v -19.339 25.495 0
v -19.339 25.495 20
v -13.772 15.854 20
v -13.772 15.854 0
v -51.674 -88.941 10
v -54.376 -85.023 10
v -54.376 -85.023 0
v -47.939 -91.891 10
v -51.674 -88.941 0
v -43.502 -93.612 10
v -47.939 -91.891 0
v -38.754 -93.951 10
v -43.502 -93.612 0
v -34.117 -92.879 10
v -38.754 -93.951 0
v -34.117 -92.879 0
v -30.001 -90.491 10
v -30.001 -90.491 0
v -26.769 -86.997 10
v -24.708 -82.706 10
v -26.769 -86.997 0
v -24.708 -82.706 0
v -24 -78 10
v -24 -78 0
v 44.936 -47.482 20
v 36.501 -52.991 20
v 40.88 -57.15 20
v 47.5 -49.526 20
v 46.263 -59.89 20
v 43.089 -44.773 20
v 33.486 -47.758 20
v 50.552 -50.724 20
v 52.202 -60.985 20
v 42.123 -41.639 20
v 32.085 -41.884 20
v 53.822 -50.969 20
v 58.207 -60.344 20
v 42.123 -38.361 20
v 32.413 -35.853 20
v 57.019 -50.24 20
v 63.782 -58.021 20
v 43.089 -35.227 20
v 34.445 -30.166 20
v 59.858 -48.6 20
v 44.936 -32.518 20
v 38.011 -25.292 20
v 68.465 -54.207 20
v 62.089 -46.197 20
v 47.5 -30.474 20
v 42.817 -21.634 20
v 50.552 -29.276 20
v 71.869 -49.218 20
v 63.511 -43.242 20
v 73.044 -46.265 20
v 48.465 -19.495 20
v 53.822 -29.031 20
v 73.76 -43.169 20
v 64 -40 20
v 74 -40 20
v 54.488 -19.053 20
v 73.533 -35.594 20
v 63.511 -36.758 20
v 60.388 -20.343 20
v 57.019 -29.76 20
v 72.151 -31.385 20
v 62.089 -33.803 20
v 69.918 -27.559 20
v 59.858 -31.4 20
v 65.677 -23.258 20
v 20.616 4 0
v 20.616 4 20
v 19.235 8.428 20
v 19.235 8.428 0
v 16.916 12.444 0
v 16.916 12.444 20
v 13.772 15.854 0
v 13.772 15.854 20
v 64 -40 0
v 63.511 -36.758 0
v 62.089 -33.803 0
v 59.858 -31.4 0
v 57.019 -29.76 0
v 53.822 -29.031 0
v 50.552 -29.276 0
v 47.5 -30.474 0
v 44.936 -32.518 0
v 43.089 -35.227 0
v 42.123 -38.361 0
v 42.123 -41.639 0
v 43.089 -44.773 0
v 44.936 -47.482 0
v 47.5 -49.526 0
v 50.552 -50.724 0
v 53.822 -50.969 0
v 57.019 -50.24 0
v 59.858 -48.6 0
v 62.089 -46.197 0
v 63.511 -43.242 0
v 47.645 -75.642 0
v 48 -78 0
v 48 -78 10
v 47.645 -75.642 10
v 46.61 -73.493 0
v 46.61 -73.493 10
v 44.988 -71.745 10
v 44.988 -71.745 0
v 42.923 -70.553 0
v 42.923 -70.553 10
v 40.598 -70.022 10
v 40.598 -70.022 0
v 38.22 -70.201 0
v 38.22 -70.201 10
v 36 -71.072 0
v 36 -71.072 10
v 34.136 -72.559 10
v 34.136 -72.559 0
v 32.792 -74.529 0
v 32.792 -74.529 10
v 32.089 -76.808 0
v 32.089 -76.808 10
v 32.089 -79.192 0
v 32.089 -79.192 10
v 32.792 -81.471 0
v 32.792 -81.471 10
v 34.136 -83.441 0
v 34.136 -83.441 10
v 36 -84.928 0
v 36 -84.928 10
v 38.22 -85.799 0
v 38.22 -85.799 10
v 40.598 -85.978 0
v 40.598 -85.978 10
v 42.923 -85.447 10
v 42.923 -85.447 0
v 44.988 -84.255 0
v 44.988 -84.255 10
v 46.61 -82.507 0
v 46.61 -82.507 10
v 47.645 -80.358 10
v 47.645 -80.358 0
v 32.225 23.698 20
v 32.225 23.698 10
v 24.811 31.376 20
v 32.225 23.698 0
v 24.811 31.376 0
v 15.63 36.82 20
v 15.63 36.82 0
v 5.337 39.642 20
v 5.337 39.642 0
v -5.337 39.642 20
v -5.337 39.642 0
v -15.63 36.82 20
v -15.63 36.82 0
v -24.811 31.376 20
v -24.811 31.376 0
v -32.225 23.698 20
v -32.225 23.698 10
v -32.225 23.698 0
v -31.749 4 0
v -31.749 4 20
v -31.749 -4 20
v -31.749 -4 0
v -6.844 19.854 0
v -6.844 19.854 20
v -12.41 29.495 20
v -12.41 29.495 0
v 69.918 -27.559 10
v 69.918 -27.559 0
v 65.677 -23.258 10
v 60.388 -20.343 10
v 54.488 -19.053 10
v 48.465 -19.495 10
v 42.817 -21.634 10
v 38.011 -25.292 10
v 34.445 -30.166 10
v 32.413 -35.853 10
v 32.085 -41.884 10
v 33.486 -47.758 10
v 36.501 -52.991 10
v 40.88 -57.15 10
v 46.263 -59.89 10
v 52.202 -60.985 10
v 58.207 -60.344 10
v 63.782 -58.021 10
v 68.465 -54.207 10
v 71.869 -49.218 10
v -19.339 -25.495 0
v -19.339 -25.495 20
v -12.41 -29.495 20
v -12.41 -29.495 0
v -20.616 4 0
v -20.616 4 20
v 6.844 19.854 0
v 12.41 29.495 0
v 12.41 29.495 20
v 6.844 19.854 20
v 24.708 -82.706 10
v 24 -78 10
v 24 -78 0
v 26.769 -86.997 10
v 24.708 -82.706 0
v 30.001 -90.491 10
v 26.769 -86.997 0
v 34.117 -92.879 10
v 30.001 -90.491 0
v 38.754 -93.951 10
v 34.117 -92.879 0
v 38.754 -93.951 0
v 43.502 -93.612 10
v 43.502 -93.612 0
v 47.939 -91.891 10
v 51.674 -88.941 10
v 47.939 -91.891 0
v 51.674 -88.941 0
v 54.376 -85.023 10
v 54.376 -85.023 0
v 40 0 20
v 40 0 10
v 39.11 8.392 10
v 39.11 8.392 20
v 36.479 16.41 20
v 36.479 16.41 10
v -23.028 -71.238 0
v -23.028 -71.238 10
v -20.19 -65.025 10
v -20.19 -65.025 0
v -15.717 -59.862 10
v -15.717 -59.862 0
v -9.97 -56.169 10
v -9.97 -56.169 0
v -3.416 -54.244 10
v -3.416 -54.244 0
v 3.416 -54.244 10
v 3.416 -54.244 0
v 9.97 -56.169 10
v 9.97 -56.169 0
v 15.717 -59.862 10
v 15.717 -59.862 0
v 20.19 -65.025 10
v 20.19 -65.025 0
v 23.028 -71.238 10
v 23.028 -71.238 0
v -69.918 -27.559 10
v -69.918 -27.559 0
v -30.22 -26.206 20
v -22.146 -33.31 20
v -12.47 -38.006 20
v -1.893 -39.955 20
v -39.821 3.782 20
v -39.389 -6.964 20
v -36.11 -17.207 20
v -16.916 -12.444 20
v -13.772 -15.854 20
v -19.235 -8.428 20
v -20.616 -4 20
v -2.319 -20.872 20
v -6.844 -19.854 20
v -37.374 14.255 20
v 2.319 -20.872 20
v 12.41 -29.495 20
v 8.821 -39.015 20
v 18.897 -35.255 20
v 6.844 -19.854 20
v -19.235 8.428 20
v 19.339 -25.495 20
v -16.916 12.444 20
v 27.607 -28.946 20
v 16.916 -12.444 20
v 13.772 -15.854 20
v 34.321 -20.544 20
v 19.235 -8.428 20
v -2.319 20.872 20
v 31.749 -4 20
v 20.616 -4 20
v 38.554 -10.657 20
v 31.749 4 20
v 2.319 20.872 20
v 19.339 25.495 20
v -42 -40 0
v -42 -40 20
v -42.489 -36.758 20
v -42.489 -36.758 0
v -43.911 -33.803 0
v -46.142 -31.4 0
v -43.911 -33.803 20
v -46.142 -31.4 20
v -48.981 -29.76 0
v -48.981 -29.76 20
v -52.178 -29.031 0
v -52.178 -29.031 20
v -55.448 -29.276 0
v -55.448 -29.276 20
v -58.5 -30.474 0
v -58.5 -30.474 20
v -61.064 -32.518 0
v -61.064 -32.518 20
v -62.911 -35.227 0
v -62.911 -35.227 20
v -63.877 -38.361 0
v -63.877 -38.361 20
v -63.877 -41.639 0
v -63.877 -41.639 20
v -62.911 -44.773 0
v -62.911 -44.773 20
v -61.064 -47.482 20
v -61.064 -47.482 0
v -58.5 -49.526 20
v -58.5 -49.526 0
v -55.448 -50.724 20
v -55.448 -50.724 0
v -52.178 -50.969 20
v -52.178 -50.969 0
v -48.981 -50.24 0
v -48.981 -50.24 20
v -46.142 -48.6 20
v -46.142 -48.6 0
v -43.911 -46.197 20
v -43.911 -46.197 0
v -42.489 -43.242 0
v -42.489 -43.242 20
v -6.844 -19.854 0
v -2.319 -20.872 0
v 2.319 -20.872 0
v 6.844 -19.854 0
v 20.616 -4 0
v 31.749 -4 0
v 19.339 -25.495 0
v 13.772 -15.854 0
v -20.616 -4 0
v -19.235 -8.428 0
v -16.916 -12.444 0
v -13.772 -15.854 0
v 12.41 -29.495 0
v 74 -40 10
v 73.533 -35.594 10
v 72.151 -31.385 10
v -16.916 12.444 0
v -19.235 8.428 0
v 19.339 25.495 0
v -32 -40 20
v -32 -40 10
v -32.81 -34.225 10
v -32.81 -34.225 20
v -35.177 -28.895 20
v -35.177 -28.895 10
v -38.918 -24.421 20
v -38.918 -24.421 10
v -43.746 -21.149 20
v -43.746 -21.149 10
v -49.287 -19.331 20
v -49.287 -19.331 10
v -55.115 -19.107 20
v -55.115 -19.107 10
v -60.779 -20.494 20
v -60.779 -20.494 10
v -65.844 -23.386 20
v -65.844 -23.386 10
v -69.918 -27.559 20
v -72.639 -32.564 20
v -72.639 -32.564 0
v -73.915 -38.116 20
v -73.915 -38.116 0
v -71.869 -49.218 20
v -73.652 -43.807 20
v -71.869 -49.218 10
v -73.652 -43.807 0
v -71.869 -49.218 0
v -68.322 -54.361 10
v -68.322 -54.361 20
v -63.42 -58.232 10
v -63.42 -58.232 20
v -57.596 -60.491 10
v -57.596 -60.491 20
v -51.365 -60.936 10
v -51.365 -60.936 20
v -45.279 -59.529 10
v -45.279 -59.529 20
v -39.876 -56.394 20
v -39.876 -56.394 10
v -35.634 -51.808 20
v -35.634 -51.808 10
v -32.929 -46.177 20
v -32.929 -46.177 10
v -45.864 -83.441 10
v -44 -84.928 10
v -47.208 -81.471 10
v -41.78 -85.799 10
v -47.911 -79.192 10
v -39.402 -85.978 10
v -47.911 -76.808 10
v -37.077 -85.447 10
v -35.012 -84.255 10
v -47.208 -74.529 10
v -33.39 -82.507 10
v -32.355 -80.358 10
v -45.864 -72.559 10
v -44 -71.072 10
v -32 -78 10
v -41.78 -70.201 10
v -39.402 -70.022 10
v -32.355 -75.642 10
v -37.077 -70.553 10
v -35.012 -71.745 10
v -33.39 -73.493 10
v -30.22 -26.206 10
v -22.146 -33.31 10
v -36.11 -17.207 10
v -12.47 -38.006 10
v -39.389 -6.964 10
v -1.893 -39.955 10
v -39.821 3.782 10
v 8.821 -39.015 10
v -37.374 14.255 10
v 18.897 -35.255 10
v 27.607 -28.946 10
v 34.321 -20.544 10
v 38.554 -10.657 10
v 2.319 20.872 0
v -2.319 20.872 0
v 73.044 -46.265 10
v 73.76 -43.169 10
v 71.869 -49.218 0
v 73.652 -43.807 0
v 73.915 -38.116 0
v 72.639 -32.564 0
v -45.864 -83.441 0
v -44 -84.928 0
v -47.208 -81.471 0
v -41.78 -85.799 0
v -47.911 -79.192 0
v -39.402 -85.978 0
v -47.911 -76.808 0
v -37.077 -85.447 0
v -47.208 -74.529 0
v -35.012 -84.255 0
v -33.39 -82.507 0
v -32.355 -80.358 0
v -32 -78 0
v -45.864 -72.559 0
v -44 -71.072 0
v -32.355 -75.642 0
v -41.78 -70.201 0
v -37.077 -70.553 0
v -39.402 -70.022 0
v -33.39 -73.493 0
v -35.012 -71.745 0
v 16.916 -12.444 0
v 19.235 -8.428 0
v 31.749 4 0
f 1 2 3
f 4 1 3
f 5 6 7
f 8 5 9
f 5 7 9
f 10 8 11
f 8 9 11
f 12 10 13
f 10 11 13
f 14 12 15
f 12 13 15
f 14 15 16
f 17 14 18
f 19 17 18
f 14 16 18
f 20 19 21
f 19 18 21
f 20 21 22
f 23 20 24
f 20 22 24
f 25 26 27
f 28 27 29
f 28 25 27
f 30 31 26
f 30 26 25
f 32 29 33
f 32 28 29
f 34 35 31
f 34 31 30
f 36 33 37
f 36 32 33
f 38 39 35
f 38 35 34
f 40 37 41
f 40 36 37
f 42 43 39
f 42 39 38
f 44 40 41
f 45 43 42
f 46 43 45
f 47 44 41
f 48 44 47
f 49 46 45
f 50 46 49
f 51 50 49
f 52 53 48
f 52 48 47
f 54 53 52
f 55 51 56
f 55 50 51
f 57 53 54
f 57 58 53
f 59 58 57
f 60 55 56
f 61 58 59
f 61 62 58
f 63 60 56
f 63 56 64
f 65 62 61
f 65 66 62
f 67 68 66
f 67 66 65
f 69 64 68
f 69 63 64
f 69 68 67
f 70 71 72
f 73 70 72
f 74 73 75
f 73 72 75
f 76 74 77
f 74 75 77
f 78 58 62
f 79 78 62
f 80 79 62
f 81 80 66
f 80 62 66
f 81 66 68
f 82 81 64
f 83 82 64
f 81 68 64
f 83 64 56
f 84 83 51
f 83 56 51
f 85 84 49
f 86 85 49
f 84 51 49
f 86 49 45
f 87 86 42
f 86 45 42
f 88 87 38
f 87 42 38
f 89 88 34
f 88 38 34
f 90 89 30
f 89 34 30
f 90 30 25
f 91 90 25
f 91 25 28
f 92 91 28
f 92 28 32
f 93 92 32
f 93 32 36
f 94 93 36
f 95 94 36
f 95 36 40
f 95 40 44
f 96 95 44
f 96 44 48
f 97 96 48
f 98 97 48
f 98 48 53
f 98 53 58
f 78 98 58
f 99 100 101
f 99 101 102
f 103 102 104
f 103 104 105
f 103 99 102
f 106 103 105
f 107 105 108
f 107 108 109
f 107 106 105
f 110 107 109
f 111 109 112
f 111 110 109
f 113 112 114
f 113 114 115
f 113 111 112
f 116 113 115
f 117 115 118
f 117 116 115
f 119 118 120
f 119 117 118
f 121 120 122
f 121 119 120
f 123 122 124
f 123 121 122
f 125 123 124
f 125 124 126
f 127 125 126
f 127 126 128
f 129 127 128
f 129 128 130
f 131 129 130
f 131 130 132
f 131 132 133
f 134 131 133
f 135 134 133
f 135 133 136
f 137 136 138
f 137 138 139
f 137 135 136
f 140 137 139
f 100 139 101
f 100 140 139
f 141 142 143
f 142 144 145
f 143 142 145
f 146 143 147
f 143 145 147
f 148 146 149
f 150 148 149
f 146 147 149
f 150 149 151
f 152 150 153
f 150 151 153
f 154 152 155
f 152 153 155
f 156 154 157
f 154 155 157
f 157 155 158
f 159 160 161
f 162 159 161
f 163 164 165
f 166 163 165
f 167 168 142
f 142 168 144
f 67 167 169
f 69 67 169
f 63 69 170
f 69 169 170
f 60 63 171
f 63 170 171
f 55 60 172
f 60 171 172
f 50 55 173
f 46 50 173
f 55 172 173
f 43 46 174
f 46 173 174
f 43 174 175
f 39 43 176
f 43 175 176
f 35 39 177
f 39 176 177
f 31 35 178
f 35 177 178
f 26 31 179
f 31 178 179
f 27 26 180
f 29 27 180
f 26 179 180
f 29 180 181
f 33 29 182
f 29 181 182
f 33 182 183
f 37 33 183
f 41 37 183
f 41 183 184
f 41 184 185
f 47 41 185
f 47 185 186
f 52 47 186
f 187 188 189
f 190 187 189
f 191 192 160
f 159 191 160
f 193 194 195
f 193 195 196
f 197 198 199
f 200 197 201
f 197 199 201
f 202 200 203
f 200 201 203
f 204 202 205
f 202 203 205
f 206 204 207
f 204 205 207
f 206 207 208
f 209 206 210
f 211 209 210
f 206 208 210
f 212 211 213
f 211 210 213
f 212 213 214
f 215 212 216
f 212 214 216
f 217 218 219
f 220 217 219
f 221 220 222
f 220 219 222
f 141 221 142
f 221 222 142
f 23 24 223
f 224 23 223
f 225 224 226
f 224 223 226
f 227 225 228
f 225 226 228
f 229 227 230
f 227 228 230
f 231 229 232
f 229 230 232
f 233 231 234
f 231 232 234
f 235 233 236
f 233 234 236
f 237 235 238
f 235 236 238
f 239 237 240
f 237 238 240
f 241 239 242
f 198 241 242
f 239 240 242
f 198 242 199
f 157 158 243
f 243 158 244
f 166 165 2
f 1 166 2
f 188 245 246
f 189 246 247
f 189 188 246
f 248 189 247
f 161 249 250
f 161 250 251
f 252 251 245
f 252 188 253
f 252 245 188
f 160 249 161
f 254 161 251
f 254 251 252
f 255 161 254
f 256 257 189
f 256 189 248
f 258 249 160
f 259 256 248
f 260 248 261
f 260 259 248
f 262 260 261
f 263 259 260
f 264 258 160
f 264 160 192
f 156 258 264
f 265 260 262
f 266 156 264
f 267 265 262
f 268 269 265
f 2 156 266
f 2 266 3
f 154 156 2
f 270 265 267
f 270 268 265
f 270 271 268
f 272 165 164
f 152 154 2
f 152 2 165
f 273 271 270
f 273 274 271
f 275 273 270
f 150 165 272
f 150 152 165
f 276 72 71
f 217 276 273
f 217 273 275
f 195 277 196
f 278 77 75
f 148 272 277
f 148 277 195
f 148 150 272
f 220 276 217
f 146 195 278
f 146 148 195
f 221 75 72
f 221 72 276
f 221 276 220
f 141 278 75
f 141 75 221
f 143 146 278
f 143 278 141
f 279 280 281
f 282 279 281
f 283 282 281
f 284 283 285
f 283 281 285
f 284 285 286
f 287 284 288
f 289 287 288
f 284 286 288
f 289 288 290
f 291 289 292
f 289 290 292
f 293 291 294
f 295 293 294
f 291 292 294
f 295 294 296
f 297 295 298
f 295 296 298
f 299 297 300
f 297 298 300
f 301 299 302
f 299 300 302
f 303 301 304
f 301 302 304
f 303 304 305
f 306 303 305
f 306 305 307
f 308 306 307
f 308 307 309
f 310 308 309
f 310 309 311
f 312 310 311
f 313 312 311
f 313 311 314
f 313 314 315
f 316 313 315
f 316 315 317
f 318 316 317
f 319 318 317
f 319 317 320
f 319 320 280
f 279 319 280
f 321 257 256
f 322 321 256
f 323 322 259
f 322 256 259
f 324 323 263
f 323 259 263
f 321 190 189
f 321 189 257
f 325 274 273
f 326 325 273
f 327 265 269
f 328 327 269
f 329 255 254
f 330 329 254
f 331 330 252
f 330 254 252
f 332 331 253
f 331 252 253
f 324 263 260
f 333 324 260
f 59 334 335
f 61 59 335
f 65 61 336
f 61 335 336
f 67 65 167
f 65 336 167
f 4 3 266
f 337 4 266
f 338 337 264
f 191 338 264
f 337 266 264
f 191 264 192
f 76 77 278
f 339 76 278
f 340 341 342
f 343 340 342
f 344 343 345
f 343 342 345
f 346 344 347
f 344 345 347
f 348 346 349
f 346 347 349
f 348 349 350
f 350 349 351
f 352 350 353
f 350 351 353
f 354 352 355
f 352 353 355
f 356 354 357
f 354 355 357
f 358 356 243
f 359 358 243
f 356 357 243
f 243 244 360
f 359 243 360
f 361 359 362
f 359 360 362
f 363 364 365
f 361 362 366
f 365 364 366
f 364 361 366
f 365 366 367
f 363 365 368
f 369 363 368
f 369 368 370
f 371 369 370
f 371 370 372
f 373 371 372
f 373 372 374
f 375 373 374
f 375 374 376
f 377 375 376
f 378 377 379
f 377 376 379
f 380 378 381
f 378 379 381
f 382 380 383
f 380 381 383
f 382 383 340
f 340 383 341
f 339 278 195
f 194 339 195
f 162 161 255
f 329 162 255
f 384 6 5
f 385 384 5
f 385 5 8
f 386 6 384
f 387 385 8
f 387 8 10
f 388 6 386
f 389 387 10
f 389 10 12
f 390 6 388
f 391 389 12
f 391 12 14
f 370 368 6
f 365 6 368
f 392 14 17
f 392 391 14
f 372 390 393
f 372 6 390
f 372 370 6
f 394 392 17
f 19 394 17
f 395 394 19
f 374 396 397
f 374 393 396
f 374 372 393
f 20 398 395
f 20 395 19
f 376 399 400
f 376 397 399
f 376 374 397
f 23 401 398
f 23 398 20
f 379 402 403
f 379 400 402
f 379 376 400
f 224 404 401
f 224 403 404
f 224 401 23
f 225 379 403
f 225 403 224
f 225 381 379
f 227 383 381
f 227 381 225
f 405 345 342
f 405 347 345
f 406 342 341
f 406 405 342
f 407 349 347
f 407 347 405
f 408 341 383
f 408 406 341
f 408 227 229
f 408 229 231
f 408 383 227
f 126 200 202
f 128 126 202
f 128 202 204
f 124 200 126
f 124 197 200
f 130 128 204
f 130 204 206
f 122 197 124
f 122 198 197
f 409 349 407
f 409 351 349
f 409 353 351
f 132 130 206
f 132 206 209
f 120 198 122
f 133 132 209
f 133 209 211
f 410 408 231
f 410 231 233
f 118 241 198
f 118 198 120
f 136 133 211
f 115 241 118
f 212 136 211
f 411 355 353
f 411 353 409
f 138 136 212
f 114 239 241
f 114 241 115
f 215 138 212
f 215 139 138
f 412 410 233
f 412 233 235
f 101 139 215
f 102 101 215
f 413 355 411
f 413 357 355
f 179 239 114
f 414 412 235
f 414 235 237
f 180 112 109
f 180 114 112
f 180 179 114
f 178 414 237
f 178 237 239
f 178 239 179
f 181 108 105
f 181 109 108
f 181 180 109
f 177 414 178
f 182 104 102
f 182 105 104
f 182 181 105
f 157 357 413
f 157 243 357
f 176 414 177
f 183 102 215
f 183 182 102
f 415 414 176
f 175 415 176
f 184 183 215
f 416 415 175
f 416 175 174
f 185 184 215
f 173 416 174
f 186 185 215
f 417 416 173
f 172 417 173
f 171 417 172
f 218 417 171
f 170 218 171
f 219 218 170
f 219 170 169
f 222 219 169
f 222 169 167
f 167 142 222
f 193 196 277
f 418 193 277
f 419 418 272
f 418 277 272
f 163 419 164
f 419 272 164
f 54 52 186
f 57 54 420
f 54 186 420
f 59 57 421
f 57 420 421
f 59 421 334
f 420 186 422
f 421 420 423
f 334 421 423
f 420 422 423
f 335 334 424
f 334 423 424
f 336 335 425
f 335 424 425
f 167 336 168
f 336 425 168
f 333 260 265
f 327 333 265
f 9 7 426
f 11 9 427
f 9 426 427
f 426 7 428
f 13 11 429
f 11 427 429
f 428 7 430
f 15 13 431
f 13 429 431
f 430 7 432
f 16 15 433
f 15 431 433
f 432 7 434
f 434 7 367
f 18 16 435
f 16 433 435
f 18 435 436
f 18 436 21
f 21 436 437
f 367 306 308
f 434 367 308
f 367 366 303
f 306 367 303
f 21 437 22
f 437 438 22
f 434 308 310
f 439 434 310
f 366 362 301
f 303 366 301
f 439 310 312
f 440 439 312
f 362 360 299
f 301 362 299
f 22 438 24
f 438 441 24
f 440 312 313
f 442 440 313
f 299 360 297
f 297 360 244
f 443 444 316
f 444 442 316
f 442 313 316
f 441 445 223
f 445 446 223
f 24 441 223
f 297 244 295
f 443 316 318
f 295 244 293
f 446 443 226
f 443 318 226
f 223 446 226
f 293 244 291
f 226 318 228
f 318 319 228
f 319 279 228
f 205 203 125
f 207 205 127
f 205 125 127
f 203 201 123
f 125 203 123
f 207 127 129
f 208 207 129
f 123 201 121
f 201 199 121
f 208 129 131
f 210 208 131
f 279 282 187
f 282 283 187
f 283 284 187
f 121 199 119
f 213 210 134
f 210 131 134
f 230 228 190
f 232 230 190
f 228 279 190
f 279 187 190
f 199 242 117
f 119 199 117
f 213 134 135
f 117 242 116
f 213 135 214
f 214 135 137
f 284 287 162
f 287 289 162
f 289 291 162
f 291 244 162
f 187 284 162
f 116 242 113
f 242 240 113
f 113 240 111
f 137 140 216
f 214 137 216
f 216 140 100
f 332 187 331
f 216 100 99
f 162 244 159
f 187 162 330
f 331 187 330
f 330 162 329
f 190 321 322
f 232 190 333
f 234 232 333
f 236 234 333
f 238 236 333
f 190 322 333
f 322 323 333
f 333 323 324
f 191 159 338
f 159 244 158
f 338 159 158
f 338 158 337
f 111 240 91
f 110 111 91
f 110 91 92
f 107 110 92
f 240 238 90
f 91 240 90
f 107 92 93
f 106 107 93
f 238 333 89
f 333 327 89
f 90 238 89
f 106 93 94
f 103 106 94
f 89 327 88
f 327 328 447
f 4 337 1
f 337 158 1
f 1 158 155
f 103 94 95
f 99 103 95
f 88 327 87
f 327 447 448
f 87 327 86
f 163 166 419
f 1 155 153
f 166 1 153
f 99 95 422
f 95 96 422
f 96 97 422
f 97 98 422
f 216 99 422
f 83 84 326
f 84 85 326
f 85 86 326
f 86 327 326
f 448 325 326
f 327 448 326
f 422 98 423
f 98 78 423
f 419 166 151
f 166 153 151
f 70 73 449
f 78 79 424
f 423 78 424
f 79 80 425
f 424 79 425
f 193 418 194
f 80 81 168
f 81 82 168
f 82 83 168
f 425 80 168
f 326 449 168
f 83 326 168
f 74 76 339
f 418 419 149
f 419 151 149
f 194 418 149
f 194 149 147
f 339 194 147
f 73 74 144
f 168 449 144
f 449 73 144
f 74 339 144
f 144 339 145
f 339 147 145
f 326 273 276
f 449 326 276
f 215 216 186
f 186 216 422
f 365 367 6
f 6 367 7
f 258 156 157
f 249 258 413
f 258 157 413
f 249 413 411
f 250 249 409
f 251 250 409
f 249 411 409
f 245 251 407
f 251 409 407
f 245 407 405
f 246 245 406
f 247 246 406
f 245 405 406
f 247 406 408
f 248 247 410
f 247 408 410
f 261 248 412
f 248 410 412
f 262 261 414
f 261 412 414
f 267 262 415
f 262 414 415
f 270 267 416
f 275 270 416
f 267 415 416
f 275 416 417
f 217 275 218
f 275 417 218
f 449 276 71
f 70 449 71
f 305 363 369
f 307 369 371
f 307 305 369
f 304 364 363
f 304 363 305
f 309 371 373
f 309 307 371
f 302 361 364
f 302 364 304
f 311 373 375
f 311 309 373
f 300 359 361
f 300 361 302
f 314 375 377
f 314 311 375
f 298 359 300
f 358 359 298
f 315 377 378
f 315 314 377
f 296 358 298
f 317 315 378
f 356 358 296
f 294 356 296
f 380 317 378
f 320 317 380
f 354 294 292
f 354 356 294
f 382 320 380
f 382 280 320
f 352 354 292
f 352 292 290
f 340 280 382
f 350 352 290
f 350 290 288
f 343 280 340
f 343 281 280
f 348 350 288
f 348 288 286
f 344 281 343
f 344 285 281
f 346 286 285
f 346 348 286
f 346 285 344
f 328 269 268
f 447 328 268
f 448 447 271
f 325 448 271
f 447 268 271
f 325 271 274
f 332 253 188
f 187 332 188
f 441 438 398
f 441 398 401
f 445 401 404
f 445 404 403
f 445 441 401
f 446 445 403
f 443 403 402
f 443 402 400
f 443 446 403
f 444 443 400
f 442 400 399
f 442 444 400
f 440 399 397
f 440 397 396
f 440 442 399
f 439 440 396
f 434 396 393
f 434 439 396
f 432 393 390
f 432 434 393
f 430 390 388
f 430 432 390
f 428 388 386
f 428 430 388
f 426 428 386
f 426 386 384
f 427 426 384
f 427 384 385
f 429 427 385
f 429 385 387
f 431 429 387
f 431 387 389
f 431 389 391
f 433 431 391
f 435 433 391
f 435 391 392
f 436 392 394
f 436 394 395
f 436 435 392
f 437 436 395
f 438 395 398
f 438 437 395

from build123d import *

# Parameters (mm, degrees)
CROQUIS1_R              = 8
SALIENTE_EXTRUIR1_DEPTH = 10
SALIENTE_EXTRUIR2_DEPTH = 10
CROQUIS3_R              = 11
CORTAR_EXTRUIR1_DEPTH   = 122.2930336


with BuildPart() as part:
    # Croquis1 → Saliente-Extruir1 (new body)
    with BuildSketch(Plane.XY):
        with BuildLine():
            Line((-32.224593289, 23.697586108), (-69.917911477, -27.558767293))
            ThreePointArc((-69.917911477, -27.558767293), (-73.915346544, -38.116312412), (-71.868614208, -49.218210124))
            Line((-71.868614208, -49.218210124), (-54.376087015, -85.023398189))
            ThreePointArc((-54.376087015, -85.023398189), (-36.395654862, -93.588736194), (-24, -78))
            ThreePointArc((-24, -78), (0, -54), (24, -78))
            ThreePointArc((24, -78), (36.395654862, -93.588736194), (54.376087015, -85.023398189))
            Line((54.376087015, -85.023398189), (71.868614208, -49.218210124))
            ThreePointArc((71.868614208, -49.218210124), (73.915346544, -38.116312412), (69.917911477, -27.558767293))
            Line((69.917911477, -27.558767293), (32.224593289, 23.697586108))
            ThreePointArc((32.224593289, 23.697586108), (0, 40), (-32.224593289, 23.697586108))
        make_face()
        with Locations((-40, -78)):
            Circle(CROQUIS1_R, mode=Mode.SUBTRACT)
        with Locations((40, -78)):
            Circle(CROQUIS1_R, mode=Mode.SUBTRACT)
    extrude(amount=SALIENTE_EXTRUIR1_DEPTH)

    # Croquis2 → Saliente-Extruir2 (add)
    with BuildSketch(Plane.XY.offset(10)):
        with BuildLine():
            ThreePointArc((32.224593289, 23.697586108), (0, 40), (-32.224593289, 23.697586108))
            ThreePointArc((-32.224593289, 23.697586108), (-12.470290061, -38.006471367), (40, 0))
            ThreePointArc((40, 0), (38.006471367, 12.470290061), (32.224593289, 23.697586108))
        make_face()
        with BuildLine():
            ThreePointArc((-32, -40), (-46.453097718, -20.046602532), (-69.917911477, -27.558767293))
            ThreePointArc((-69.917911477, -27.558767293), (-73.915346544, -38.116312412), (-71.868614208, -49.218210124))
            ThreePointArc((-71.868614208, -49.218210124), (-48.269297006, -60.460216254), (-32, -40))
        make_face()
        with BuildLine():
            ThreePointArc((74, -40), (72.953397468, -33.453097718), (69.917911477, -27.558767293))
            ThreePointArc((69.917911477, -27.558767293), (32.084653456, -41.883687588), (71.868614208, -49.218210124))
            ThreePointArc((71.868614208, -49.218210124), (73.460216254, -44.730702994), (74, -40))
        make_face()
    extrude(amount=SALIENTE_EXTRUIR2_DEPTH)

    # Croquis3 → Cortar-Extruir1 (cut, through all)
    with BuildSketch(Plane.XY.offset(20)):
        with BuildLine():
            Line((-12.410406251, -29.49545417), (-6.843662449, -19.853571071))
            ThreePointArc((-6.843662449, -19.853571071), (0, -21), (6.843662449, -19.853571071))
            Line((6.843662449, -19.853571071), (12.410406251, -29.49545417))
            Line((12.410406251, -29.49545417), (19.338609482, -25.49545417))
            Line((19.338609482, -25.49545417), (13.771865679, -15.853571071))
            ThreePointArc((13.771865679, -15.853571071), (18.186533479, -10.5), (20.615528128, -4))
            Line((20.615528128, -4), (31.749015733, -4))
            Line((31.749015733, -4), (31.749015733, 4))
            Line((31.749015733, 4), (20.615528128, 4))
            ThreePointArc((20.615528128, 4), (18.186533479, 10.5), (13.771865679, 15.853571071))
            Line((13.771865679, 15.853571071), (19.338609482, 25.49545417))
            Line((19.338609482, 25.49545417), (12.410406251, 29.49545417))
            Line((12.410406251, 29.49545417), (6.843662449, 19.853571071))
            ThreePointArc((6.843662449, 19.853571071), (0, 21), (-6.843662449, 19.853571071))
            Line((-6.843662449, 19.853571071), (-12.410406251, 29.49545417))
            Line((-12.410406251, 29.49545417), (-19.338609482, 25.49545417))
            Line((-19.338609482, 25.49545417), (-13.771865679, 15.853571071))
            ThreePointArc((-13.771865679, 15.853571071), (-18.186533479, 10.5), (-20.615528128, 4))
            Line((-20.615528128, 4), (-31.749015733, 4))
            Line((-31.749015733, 4), (-31.749015733, -4))
            Line((-31.749015733, -4), (-20.615528128, -4))
            ThreePointArc((-20.615528128, -4), (-18.186533479, -10.5), (-13.771865679, -15.853571071))
            Line((-13.771865679, -15.853571071), (-19.338609482, -25.49545417))
            Line((-19.338609482, -25.49545417), (-12.410406251, -29.49545417))
        make_face()
        with Locations((53, -40)):
            Circle(CROQUIS3_R)
        with Locations((-53, -40)):
            Circle(CROQUIS3_R)
    extrude(amount=-CORTAR_EXTRUIR1_DEPTH, mode=Mode.SUBTRACT)


solid = part.part
